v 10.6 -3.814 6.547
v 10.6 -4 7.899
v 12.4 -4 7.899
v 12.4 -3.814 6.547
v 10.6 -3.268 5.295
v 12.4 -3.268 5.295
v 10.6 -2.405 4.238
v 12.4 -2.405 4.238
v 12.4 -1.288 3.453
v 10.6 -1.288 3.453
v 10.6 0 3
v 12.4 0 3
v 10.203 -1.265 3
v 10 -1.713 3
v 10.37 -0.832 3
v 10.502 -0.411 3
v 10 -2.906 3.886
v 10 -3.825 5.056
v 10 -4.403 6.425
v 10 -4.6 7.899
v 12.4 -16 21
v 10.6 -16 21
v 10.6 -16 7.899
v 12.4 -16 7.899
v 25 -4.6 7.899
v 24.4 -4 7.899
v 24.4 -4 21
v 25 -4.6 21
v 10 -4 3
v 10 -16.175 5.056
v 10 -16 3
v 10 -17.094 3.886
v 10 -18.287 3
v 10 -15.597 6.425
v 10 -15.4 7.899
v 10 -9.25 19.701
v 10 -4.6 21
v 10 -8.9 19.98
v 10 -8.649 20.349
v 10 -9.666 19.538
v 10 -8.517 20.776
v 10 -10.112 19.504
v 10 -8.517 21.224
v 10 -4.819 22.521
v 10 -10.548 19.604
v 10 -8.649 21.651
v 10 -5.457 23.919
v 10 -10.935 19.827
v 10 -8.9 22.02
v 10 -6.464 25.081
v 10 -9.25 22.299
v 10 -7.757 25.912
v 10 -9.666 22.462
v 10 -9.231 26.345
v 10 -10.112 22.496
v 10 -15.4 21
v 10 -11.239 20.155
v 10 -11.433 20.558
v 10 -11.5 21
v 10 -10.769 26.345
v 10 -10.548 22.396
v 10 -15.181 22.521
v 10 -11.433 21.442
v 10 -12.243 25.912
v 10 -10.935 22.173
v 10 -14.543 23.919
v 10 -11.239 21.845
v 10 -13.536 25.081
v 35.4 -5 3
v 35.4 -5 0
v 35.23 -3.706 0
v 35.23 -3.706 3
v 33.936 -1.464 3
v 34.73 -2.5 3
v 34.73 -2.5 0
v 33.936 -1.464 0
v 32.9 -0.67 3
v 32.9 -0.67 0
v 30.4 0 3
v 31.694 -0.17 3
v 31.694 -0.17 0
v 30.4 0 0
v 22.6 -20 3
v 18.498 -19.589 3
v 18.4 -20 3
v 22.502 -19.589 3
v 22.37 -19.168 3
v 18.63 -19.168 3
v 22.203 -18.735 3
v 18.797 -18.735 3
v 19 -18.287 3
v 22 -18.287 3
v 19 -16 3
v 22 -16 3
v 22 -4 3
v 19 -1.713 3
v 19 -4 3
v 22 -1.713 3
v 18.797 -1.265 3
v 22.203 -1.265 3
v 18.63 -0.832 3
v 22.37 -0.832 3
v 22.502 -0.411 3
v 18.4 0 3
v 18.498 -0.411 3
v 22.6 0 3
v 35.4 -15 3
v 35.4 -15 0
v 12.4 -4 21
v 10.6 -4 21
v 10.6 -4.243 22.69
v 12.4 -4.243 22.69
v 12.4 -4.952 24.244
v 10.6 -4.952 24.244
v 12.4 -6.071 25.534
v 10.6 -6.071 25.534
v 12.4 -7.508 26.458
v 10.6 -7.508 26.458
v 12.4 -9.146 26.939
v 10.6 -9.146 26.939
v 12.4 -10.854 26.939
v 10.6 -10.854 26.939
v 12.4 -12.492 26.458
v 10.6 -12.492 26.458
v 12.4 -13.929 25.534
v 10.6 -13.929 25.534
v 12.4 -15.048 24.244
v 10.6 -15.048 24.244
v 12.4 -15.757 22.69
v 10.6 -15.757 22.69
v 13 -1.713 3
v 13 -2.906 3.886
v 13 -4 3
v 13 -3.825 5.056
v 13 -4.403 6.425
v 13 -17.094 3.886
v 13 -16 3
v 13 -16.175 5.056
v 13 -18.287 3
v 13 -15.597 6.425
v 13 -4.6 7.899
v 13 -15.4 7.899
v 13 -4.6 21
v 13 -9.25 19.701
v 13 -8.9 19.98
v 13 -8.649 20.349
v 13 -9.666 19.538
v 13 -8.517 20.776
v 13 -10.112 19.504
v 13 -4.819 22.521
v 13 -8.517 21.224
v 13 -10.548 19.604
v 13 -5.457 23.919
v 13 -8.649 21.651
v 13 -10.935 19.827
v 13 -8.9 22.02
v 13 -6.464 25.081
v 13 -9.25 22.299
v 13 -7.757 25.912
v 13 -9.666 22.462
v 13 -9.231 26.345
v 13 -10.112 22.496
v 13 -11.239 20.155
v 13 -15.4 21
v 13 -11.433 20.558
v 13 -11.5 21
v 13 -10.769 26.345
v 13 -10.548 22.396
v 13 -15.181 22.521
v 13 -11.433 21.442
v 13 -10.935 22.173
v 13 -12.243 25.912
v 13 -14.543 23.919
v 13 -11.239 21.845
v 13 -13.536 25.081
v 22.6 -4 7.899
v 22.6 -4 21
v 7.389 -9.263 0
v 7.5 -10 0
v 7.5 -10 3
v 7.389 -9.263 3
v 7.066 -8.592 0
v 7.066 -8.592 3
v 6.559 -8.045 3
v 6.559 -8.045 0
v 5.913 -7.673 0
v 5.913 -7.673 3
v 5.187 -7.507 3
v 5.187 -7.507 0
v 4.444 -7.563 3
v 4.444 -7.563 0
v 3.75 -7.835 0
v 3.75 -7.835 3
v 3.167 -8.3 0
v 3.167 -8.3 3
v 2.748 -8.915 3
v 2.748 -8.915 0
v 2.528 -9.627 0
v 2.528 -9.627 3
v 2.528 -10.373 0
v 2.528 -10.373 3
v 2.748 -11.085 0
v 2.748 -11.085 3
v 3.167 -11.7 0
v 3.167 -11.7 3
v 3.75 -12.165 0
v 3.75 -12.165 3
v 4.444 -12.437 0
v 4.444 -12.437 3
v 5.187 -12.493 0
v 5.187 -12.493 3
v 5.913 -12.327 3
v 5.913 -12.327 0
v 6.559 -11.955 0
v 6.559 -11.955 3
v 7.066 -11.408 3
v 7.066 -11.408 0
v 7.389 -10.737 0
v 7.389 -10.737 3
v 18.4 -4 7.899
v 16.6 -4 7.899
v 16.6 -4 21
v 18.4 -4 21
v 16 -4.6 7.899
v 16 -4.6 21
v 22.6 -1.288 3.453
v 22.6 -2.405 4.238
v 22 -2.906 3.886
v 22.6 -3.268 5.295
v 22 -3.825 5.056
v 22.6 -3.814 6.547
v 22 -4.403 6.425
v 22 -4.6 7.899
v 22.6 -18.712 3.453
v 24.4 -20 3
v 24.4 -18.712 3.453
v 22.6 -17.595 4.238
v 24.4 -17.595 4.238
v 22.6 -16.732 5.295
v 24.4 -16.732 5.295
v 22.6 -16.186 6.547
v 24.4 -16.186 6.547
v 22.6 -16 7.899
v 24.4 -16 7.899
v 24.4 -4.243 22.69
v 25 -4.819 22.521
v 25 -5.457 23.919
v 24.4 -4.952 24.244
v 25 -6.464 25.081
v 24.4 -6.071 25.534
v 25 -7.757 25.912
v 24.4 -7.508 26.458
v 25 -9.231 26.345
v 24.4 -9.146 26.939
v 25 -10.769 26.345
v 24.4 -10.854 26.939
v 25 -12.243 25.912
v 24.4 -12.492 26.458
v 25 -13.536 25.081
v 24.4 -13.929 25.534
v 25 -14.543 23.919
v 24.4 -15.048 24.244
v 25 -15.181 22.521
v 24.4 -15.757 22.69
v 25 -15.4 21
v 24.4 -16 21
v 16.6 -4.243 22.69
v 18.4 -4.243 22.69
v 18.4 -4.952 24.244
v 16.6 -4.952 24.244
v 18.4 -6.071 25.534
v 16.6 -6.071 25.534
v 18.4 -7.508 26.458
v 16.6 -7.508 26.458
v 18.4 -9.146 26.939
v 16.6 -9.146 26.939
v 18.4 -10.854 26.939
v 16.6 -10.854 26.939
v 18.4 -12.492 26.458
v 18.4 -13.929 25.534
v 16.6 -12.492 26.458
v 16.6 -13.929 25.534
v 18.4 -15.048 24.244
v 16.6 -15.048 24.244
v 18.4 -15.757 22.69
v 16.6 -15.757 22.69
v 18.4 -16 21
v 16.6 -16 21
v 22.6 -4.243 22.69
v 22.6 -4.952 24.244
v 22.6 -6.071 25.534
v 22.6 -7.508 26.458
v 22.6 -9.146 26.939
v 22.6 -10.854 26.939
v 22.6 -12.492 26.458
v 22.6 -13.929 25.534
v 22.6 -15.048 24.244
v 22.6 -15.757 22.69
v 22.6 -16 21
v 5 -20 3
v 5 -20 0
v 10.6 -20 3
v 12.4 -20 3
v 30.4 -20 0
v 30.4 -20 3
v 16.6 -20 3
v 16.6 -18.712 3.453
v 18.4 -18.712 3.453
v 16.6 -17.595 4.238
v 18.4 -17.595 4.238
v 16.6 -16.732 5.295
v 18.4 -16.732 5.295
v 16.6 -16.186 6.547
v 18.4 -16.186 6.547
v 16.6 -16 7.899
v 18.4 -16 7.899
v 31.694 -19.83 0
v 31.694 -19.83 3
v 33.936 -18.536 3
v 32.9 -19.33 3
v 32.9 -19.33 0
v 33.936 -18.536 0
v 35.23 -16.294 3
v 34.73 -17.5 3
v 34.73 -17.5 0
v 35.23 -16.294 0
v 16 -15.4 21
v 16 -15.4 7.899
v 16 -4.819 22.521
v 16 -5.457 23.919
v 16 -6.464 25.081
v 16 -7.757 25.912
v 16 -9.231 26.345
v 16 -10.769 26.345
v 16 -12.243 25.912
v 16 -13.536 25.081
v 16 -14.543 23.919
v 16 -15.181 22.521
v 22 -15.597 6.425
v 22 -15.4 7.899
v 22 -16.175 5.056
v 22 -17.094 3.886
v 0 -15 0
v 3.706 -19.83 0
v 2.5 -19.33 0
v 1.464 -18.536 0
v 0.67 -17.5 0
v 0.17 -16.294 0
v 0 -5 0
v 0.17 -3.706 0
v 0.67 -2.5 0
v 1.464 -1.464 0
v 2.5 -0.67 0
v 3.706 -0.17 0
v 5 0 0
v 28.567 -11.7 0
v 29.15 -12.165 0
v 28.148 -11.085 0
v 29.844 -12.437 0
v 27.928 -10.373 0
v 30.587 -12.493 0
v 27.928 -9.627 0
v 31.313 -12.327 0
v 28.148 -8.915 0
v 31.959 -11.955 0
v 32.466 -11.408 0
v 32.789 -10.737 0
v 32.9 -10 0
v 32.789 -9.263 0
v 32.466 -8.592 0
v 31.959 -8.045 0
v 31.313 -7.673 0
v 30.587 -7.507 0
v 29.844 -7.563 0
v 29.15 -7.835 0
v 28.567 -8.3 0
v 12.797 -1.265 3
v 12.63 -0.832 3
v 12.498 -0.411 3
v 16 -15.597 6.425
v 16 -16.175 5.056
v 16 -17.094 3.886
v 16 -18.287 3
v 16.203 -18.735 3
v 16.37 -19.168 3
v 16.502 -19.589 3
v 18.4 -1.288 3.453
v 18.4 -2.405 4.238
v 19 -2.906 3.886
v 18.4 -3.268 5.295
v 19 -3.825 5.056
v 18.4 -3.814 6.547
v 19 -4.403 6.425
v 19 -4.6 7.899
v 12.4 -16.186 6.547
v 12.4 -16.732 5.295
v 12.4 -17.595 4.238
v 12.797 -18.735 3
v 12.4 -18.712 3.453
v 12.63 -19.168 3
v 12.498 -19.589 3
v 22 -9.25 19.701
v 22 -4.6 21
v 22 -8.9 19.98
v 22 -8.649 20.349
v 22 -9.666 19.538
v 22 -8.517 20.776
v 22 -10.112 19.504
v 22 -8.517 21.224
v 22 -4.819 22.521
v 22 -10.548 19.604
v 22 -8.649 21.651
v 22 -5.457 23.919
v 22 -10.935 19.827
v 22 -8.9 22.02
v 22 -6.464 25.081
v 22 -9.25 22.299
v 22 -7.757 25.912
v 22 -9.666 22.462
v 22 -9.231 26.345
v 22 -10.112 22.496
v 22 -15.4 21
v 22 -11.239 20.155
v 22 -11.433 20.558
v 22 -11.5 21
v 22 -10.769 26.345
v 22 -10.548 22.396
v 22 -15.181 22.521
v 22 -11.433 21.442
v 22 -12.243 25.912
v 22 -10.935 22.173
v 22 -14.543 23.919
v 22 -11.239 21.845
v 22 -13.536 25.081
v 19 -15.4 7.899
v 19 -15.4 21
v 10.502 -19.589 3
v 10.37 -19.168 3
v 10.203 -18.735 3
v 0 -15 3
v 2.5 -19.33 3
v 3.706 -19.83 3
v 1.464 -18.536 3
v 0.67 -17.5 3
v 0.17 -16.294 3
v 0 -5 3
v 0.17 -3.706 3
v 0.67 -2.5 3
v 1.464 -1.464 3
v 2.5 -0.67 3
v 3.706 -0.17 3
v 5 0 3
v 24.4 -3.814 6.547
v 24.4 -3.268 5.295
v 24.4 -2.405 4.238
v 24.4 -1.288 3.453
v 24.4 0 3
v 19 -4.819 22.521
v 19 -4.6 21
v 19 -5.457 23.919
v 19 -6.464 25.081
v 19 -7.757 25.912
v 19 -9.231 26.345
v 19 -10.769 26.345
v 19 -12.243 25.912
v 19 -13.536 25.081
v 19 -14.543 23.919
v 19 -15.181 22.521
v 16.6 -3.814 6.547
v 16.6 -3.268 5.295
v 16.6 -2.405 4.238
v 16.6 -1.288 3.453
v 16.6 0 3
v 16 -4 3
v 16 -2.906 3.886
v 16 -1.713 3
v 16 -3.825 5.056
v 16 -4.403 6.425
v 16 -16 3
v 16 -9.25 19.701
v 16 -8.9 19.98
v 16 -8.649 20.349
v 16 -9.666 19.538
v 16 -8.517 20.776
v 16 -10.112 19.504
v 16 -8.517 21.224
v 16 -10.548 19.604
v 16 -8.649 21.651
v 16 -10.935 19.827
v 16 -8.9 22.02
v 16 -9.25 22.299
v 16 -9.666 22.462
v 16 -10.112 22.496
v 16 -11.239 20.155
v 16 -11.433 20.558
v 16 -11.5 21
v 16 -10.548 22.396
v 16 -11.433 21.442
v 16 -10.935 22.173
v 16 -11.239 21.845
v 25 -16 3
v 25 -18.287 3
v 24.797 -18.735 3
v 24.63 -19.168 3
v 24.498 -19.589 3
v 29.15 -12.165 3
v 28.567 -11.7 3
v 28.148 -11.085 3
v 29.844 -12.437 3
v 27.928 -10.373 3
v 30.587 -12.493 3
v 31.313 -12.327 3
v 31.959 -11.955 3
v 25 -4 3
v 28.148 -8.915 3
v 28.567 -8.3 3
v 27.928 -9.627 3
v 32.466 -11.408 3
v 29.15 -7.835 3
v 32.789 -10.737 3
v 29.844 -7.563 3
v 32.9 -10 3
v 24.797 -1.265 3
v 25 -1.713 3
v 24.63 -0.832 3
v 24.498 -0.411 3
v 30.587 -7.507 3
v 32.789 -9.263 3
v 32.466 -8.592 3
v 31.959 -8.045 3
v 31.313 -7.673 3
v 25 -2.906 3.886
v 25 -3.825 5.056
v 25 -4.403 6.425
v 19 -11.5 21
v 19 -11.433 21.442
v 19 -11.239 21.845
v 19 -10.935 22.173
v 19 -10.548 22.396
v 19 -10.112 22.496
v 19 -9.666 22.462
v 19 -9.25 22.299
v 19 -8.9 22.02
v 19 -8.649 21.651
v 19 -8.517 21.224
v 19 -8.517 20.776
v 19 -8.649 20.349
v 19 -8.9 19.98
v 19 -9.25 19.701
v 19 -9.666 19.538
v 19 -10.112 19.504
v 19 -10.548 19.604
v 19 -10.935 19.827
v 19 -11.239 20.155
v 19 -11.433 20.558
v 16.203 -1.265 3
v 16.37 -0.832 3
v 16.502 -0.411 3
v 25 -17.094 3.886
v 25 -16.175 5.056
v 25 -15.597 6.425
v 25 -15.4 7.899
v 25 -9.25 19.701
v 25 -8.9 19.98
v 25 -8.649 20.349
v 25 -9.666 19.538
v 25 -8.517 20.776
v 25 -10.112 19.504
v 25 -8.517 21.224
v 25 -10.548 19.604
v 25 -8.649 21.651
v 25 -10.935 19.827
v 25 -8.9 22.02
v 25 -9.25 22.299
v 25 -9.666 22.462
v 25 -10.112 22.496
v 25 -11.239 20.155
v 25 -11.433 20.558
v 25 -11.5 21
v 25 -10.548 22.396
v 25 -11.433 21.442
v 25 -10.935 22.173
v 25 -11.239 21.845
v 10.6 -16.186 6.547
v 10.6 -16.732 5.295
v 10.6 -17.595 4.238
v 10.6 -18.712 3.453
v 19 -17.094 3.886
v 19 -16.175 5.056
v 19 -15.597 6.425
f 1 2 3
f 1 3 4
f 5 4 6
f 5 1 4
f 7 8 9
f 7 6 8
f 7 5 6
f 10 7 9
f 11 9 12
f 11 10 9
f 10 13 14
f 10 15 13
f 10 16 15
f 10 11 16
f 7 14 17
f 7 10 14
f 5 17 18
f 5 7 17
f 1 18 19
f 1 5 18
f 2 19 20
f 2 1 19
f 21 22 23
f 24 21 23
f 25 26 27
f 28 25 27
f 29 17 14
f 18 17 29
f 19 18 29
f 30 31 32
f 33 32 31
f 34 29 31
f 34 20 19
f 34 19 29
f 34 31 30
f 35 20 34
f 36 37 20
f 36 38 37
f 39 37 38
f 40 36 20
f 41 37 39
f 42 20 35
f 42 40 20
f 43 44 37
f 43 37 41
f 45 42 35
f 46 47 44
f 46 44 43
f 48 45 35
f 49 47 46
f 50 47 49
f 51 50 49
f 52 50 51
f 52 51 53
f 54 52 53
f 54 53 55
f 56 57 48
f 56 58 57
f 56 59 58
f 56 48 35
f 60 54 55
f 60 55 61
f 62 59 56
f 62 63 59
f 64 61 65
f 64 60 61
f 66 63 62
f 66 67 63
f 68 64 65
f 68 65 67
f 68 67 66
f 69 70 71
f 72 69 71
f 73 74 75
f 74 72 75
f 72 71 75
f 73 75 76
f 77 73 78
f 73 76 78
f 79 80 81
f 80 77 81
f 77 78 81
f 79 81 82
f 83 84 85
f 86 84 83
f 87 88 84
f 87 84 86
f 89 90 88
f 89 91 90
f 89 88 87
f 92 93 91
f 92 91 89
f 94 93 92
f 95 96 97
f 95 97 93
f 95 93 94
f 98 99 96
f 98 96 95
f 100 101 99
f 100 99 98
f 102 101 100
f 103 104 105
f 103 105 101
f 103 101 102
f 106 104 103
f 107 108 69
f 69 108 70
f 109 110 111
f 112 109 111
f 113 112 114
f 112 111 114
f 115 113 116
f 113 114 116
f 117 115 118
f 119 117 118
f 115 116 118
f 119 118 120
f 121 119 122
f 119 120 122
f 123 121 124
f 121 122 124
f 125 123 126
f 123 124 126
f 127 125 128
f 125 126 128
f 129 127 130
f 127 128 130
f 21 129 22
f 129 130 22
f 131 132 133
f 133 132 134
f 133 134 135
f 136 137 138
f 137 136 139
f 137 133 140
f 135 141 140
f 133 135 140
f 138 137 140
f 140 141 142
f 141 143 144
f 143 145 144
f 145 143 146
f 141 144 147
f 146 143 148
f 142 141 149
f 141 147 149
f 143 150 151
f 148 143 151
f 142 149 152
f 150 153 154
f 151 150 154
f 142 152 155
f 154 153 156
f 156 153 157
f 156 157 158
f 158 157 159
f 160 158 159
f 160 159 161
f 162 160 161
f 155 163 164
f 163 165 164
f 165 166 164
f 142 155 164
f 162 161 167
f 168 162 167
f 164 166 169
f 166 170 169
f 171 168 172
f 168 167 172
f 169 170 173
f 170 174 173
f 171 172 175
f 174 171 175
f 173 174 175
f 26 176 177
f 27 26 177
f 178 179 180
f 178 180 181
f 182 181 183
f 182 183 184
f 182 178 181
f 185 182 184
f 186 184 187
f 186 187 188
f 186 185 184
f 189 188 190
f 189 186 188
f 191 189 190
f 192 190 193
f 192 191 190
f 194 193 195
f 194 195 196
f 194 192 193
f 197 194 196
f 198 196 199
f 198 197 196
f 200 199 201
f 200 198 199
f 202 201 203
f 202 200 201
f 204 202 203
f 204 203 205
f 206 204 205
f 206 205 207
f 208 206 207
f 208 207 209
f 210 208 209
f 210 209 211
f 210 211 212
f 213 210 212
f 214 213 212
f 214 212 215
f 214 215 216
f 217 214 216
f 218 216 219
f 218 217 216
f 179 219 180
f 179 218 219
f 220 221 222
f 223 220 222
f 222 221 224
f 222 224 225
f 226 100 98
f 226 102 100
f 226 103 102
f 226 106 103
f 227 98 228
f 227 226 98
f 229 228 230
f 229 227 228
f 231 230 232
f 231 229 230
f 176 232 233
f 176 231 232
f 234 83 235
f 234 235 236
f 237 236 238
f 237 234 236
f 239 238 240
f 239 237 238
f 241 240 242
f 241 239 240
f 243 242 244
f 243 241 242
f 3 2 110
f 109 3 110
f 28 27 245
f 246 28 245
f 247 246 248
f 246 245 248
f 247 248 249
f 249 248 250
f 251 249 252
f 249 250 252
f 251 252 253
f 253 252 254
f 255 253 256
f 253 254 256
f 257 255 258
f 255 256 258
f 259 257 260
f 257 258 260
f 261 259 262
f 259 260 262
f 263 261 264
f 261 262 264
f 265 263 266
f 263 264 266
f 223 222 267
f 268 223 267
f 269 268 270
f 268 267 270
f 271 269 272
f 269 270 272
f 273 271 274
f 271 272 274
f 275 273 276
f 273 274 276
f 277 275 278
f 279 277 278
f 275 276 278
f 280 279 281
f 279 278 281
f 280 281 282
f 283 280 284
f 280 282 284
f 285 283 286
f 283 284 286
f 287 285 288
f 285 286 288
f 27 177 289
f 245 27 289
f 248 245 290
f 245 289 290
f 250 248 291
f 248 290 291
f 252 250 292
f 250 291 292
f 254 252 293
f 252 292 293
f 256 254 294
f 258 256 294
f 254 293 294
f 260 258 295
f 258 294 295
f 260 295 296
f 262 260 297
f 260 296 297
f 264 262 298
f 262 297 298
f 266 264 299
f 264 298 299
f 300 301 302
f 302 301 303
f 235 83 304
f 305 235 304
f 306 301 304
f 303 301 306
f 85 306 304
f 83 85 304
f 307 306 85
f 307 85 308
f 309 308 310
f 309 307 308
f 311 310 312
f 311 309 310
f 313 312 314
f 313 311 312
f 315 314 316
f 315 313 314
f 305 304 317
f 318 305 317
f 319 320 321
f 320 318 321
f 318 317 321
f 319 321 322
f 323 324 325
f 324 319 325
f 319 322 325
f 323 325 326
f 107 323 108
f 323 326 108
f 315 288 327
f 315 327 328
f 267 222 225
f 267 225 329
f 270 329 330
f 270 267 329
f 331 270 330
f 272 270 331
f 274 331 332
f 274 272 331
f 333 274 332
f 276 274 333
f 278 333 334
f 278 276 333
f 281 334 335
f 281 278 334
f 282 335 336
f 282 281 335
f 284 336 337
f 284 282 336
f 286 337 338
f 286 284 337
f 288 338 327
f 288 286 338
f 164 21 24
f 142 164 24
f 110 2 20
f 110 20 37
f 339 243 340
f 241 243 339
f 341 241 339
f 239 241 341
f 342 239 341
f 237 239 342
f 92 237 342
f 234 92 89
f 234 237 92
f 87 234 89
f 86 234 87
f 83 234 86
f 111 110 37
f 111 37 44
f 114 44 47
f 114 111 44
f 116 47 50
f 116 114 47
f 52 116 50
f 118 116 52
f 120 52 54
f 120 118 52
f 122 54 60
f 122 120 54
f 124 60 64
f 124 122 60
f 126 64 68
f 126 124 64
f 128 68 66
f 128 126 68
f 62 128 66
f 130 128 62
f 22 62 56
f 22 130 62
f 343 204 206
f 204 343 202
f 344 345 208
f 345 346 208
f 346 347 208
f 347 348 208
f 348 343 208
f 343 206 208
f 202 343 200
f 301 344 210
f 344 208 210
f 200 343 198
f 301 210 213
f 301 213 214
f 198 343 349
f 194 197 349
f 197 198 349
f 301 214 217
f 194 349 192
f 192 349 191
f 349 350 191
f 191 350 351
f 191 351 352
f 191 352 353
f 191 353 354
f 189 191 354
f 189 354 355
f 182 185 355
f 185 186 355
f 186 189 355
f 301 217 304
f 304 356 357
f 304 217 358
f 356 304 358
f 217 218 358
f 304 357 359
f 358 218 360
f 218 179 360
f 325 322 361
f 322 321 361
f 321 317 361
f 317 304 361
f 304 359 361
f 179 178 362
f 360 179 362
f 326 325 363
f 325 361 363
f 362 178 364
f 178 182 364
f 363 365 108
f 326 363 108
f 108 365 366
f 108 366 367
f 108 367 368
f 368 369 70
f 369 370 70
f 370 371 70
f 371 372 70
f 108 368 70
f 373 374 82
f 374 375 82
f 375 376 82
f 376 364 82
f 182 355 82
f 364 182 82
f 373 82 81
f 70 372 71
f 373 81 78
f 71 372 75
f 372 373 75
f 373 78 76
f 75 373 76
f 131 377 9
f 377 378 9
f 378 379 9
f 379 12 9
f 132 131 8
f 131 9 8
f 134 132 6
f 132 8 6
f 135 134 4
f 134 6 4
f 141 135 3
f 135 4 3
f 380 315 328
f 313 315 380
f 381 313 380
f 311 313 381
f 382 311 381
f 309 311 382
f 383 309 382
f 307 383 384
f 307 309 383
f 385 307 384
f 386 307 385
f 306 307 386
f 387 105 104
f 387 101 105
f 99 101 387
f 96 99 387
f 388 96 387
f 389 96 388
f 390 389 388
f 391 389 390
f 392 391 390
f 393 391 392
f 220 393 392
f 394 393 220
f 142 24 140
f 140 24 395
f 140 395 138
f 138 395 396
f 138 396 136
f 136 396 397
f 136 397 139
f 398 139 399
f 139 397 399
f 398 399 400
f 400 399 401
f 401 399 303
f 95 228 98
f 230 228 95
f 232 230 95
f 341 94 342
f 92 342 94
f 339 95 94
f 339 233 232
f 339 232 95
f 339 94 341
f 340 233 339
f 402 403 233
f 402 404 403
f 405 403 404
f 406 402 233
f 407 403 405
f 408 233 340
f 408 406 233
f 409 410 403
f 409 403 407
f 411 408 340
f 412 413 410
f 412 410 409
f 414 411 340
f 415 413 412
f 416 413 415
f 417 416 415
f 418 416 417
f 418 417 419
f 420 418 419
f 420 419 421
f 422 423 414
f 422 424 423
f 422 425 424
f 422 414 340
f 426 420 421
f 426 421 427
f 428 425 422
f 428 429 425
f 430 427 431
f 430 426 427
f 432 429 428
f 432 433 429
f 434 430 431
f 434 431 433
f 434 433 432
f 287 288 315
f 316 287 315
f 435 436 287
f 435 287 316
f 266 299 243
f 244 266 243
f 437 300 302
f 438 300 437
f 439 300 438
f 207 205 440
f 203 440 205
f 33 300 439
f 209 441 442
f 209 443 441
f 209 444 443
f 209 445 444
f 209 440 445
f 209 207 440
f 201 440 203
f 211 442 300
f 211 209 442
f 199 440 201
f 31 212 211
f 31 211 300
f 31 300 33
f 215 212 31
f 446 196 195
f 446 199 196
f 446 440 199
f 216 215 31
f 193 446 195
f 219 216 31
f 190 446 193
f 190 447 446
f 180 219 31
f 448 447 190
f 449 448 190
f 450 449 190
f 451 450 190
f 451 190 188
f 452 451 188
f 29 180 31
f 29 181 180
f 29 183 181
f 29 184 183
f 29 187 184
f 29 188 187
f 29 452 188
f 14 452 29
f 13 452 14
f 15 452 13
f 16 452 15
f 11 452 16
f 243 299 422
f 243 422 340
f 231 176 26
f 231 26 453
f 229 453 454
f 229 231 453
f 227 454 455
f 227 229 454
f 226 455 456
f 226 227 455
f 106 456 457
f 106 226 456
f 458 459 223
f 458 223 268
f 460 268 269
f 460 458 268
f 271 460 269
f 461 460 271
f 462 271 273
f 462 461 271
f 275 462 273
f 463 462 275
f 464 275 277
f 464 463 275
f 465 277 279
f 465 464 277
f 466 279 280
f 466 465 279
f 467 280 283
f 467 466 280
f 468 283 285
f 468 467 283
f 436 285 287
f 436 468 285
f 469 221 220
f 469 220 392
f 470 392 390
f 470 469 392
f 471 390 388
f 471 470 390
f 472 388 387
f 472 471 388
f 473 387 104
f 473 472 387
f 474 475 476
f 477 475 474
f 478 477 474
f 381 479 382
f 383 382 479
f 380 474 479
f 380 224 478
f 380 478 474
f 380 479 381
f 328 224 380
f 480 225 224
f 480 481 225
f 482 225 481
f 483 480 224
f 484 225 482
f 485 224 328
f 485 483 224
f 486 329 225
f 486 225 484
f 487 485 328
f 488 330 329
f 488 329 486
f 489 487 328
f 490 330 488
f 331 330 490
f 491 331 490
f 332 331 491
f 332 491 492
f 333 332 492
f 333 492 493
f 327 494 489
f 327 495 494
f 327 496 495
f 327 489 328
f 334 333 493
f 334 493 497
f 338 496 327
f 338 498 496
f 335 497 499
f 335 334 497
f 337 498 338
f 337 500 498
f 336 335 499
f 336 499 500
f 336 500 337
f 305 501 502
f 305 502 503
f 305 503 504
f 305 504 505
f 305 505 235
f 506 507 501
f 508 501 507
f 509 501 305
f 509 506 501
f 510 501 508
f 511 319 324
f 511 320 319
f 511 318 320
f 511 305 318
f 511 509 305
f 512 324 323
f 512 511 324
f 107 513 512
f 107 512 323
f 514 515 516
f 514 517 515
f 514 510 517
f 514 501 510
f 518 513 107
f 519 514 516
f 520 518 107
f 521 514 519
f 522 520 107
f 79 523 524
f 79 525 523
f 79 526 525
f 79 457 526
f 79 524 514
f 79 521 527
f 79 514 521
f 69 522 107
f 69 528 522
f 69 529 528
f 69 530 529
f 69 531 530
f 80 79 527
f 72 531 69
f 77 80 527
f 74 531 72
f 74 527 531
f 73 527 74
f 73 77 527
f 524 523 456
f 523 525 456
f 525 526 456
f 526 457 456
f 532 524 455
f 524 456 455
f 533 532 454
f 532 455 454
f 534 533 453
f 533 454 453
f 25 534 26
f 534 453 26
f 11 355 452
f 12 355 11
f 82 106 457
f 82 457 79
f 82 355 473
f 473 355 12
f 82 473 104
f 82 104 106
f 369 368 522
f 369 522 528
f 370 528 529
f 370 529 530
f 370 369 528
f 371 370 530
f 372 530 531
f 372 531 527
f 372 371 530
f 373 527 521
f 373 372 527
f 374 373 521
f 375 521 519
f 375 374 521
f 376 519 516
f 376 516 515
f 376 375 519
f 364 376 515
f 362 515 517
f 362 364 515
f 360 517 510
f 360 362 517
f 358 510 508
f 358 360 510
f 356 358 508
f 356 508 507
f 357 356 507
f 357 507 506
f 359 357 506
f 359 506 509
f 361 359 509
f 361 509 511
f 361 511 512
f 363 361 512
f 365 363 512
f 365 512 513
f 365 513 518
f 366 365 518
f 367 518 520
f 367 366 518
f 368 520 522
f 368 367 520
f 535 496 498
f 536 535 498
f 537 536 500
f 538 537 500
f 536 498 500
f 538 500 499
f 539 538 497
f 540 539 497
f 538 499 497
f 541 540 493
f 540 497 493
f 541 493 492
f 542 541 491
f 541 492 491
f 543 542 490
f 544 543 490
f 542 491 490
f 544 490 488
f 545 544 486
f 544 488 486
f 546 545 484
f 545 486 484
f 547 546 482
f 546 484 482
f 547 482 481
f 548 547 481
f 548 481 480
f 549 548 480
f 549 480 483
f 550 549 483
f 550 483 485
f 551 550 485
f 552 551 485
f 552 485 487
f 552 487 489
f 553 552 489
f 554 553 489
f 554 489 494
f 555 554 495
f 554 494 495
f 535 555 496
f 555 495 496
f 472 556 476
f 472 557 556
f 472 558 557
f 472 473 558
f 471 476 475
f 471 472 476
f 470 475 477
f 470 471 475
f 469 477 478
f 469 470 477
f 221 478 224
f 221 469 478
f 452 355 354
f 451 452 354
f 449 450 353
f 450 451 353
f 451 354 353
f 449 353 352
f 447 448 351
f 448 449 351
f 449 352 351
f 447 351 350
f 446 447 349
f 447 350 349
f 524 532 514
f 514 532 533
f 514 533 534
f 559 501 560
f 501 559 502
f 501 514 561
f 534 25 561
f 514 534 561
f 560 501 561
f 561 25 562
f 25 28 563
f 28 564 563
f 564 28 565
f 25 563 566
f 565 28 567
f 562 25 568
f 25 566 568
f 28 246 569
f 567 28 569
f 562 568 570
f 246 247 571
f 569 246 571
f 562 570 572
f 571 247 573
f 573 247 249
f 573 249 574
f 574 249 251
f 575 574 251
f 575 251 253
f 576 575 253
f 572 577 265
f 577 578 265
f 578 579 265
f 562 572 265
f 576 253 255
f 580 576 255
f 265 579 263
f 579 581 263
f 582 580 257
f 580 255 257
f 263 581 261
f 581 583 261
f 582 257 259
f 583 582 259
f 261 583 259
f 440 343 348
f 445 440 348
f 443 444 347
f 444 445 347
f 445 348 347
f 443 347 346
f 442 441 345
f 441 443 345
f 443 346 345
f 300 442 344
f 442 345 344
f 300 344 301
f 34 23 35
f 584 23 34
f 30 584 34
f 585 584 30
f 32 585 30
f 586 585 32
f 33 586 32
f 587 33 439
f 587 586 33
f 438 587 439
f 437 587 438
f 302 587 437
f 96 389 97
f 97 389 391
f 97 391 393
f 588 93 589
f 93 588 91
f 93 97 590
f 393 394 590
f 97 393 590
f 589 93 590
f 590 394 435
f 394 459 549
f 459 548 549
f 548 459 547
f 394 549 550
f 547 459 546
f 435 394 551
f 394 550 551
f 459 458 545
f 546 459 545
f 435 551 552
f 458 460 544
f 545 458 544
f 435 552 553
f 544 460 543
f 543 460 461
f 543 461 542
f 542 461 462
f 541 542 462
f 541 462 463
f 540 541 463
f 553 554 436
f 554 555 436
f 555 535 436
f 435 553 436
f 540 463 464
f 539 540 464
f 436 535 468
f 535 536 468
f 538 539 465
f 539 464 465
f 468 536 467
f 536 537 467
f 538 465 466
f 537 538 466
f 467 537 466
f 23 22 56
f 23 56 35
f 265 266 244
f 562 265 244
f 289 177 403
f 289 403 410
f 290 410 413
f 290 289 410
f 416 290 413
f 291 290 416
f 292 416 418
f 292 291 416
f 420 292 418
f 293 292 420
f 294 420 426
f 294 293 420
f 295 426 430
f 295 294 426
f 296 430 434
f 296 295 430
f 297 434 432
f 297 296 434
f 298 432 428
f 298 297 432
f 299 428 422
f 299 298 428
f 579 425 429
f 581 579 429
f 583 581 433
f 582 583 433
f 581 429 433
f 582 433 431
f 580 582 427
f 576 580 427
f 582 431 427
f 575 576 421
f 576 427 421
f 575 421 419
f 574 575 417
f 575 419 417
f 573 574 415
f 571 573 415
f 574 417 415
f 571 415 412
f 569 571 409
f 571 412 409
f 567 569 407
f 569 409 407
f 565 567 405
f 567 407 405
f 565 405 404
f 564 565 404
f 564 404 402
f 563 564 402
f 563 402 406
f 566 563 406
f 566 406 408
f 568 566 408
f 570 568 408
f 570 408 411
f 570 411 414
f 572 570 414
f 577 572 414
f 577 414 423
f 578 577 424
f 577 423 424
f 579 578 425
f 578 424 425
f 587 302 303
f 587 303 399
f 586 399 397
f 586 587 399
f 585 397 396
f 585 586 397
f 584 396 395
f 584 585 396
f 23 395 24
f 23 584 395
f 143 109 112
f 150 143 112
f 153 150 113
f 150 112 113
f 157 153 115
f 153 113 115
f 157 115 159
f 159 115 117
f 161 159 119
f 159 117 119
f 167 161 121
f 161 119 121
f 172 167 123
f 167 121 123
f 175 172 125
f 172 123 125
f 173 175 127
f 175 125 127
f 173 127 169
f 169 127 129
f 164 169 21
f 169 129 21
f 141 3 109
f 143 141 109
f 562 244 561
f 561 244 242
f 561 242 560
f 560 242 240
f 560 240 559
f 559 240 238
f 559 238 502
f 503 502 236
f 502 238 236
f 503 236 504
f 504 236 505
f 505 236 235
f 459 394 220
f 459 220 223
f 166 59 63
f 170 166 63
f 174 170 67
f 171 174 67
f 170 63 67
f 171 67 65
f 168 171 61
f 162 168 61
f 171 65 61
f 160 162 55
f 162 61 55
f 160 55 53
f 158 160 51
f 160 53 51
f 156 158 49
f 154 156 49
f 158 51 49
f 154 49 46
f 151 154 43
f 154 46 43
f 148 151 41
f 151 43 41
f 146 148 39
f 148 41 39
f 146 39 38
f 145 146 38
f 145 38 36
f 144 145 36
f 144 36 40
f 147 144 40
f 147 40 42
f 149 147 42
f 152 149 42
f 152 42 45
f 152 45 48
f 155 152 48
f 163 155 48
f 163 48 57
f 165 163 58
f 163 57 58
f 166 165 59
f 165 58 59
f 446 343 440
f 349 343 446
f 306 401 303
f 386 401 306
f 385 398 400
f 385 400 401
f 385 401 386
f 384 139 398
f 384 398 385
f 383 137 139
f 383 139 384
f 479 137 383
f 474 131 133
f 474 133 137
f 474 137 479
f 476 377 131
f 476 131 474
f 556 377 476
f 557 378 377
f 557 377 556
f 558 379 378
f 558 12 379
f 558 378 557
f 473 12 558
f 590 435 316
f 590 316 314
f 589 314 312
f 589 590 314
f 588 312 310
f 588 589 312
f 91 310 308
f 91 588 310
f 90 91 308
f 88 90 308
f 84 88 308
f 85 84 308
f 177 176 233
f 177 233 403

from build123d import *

# Parameters (mm, degrees)
SKETCH_1_W             = 35.4
SKETCH_1_H             = 20
SKETCH_1_R             = 2.5
EXTRUDE_1_DEPTH        = 3
EXTRUDE_START          = -10
SKETCH_3_R             = 1.5
EXTRUDE_2_DEPTH        = 3
PATTERN_LINEAR_1_COUNT = 3
PATTERN_LINEAR_1_PITCH = 6
FILLET_1_R             = 5
CHAMFER_1_SIZE         = 0.6


with BuildPart() as part:
    # 草图1 → 凸台-拉伸1 (new body)
    with BuildSketch(Plane.XY):
        with Locations((17.7, -10)):
            Rectangle(SKETCH_1_W, SKETCH_1_H)
        with Locations((5, -10)):
            Circle(SKETCH_1_R, mode=Mode.SUBTRACT)
        with Locations((30.4, -10)):
            Circle(SKETCH_1_R, mode=Mode.SUBTRACT)
    extrude(amount=EXTRUDE_1_DEPTH)

    # 草图3 → 凸台-拉伸2 (add)
    with BuildSketch(Plane.ZY.offset(EXTRUDE_START)):
        with BuildLine():
            Line((3, -4), (21, -4))
            ThreePointArc((21, -4), (27, -10), (21, -16))
            Line((21, -16), (3, -16))
            Line((3, -16), (3, -4))
        make_face()
        with Locations(Location((21, -10, 0), (0, 0, 270))):
            Circle(SKETCH_3_R, mode=Mode.SUBTRACT)
    extrude_2 = extrude(amount=-EXTRUDE_2_DEPTH)

    # 阵列(线性)1: 凸台-拉伸2 ×3
    with Locations(*[(i * PATTERN_LINEAR_1_PITCH, 0, 0) for i in range(1, PATTERN_LINEAR_1_COUNT)]):
        add(extrude_2)

    # 圆角1
    # the kernel refuses this fillet: 5 mm, written as the material it adds along each edge
    with BuildSketch(Plane(origin=(10, -16, 3), x_dir=(0, -1.0, 1.572297847473644e-12), z_dir=(1, 0, 0)), Plane(origin=(16, -16, 3), x_dir=(0, -1.0, 1.572297847473644e-12), z_dir=(1, 0, 0)), Plane(origin=(22, -16, 3), x_dir=(0, -1.0, 1.572297847473644e-12), z_dir=(1, 0, 0))) as fillet_1_piece_1:
        with BuildLine():
            CenterArc((5, -4.898979486), FILLET_1_R, 101.536959033, 78.463040967)
            Line((0, -4.898979486), (0, 0))
            Line((0, 0), (4, 0))
        make_face()
    extrude(amount=3)
    with BuildSketch(Plane(origin=(-2.247448714, -16, 3), x_dir=(0, -1.0, 1.572297847473644e-12), z_dir=(1, 0, 0))) as fillet_1_piece_2_section:
        with BuildLine():
            CenterArc((5, -4.898979486), FILLET_1_R, 101.536959033, 78.463040967)
            Line((0, -4.898979486), (0, 0))
            Line((0, 0), (4, 0))
        make_face()
    fillet_1_piece_2 = extrude(amount=27.494897428, mode=Mode.PRIVATE)
    fillet_1_piece_2 = split(fillet_1_piece_2, bisect_by=Plane(origin=(16, -16, 3), z_dir=(1, 0, 0)), keep=Keep.TOP, mode=Mode.PRIVATE)
    fillet_1_piece_2 = split(fillet_1_piece_2, bisect_by=Plane(origin=(19, -16, 3), z_dir=(-1, 0, 0)), keep=Keep.TOP, mode=Mode.PRIVATE)
    add(fillet_1_piece_2)
    with BuildSketch(Plane(origin=(-2.247448714, -16, 3), x_dir=(0, -1.0, 1.572297847473644e-12), z_dir=(1, 0, 0))) as fillet_1_piece_3_section:
        with BuildLine():
            CenterArc((5, -4.898979486), FILLET_1_R, 101.536959033, 78.463040967)
            Line((0, -4.898979486), (0, 0))
            Line((0, 0), (4, 0))
        make_face()
    fillet_1_piece_3 = extrude(amount=27.494897428, mode=Mode.PRIVATE)
    fillet_1_piece_3 = split(fillet_1_piece_3, bisect_by=Plane(origin=(25, -16, 3), z_dir=(-1, 0, 0)), keep=Keep.TOP, mode=Mode.PRIVATE)
    fillet_1_piece_3 = split(fillet_1_piece_3, bisect_by=Plane(origin=(22, -16, 3), z_dir=(1, 0, 0)), keep=Keep.TOP, mode=Mode.PRIVATE)
    add(fillet_1_piece_3)
    with BuildSketch(Plane(origin=(10, -4, 3), x_dir=(0, 1.0, 1.568078999980068e-12), z_dir=(1, 0, 0)), Plane(origin=(16, -4, 3), x_dir=(0, 1.0, 1.568078999980068e-12), z_dir=(1, 0, 0)), Plane(origin=(22, -4, 3), x_dir=(0, 1.0, 1.568078999980068e-12), z_dir=(1, 0, 0))) as fillet_1_piece_4:
        with BuildLine():
            CenterArc((5, 4.898979486), FILLET_1_R, 180, 78.463040967)
            Line((0, 4.898979486), (0, 0))
            Line((0, 0), (4, 0))
        make_face()
    extrude(amount=3)
    with BuildSketch(Plane(origin=(-2.247448714, -4, 3), x_dir=(0, 1.0, 1.568078999980068e-12), z_dir=(1, 0, 0))) as fillet_1_piece_5_section:
        with BuildLine():
            CenterArc((5, 4.898979486), FILLET_1_R, 180, 78.463040967)
            Line((0, 4.898979486), (0, 0))
            Line((0, 0), (4, 0))
        make_face()
    fillet_1_piece_5 = extrude(amount=27.494897428, mode=Mode.PRIVATE)
    fillet_1_piece_5 = split(fillet_1_piece_5, bisect_by=Plane(origin=(16, -4, 3), z_dir=(1, 0, 0)), keep=Keep.TOP, mode=Mode.PRIVATE)
    fillet_1_piece_5 = split(fillet_1_piece_5, bisect_by=Plane(origin=(19, -4, 3), z_dir=(-1, 0, 0)), keep=Keep.TOP, mode=Mode.PRIVATE)
    add(fillet_1_piece_5)
    with BuildSketch(Plane(origin=(-2.247448714, -4, 3), x_dir=(0, 1.0, 1.568078999980068e-12), z_dir=(1, 0, 0))) as fillet_1_piece_6_section:
        with BuildLine():
            CenterArc((5, 4.898979486), FILLET_1_R, 180, 78.463040967)
            Line((0, 4.898979486), (0, 0))
            Line((0, 0), (4, 0))
        make_face()
    fillet_1_piece_6 = extrude(amount=27.494897428, mode=Mode.PRIVATE)
    fillet_1_piece_6 = split(fillet_1_piece_6, bisect_by=Plane(origin=(25, -4, 3), z_dir=(-1, 0, 0)), keep=Keep.TOP, mode=Mode.PRIVATE)
    fillet_1_piece_6 = split(fillet_1_piece_6, bisect_by=Plane(origin=(22, -4, 3), z_dir=(1, 0, 0)), keep=Keep.TOP, mode=Mode.PRIVATE)
    add(fillet_1_piece_6)
    with BuildSketch(Plane(origin=(3.752551286, -16, 3), x_dir=(0, -1.0, 1.572297847473644e-12), z_dir=(1, 0, 0))) as fillet_1_piece_7_section:
        with BuildLine():
            CenterArc((5, -4.898979486), FILLET_1_R, 101.536959033, 78.463040967)
            Line((0, -4.898979486), (0, 0))
            Line((0, 0), (4, 0))
        make_face()
    fillet_1_piece_7 = extrude(amount=27.494897428, mode=Mode.PRIVATE)
    fillet_1_piece_7 = split(fillet_1_piece_7, bisect_by=Plane(origin=(10, -16, 3), z_dir=(1, 0, 0)), keep=Keep.TOP, mode=Mode.PRIVATE)
    fillet_1_piece_7 = split(fillet_1_piece_7, bisect_by=Plane(origin=(13, -16, 3), z_dir=(-1, 0, 0)), keep=Keep.TOP, mode=Mode.PRIVATE)
    add(fillet_1_piece_7)
    with BuildSketch(Plane(origin=(3.752551286, -16, 3), x_dir=(0, -1.0, 1.572297847473644e-12), z_dir=(1, 0, 0))) as fillet_1_piece_8_section:
        with BuildLine():
            CenterArc((5, -4.898979486), FILLET_1_R, 101.536959033, 78.463040967)
            Line((0, -4.898979486), (0, 0))
            Line((0, 0), (4, 0))
        make_face()
    fillet_1_piece_8 = extrude(amount=27.494897428, mode=Mode.PRIVATE)
    fillet_1_piece_8 = split(fillet_1_piece_8, bisect_by=Plane(origin=(25, -16, 3), z_dir=(-1, 0, 0)), keep=Keep.TOP, mode=Mode.PRIVATE)
    fillet_1_piece_8 = split(fillet_1_piece_8, bisect_by=Plane(origin=(22, -16, 3), z_dir=(1, 0, 0)), keep=Keep.TOP, mode=Mode.PRIVATE)
    add(fillet_1_piece_8)
    with BuildSketch(Plane(origin=(3.752551286, -4, 3), x_dir=(0, 1.0, 1.568078999980068e-12), z_dir=(1, 0, 0))) as fillet_1_piece_9_section:
        with BuildLine():
            CenterArc((5, 4.898979486), FILLET_1_R, 180, 78.463040967)
            Line((0, 4.898979486), (0, 0))
            Line((0, 0), (4, 0))
        make_face()
    fillet_1_piece_9 = extrude(amount=27.494897428, mode=Mode.PRIVATE)
    fillet_1_piece_9 = split(fillet_1_piece_9, bisect_by=Plane(origin=(10, -4, 3), z_dir=(1, 0, 0)), keep=Keep.TOP, mode=Mode.PRIVATE)
    fillet_1_piece_9 = split(fillet_1_piece_9, bisect_by=Plane(origin=(13, -4, 3), z_dir=(-1, 0, 0)), keep=Keep.TOP, mode=Mode.PRIVATE)
    add(fillet_1_piece_9)
    with BuildSketch(Plane(origin=(3.752551286, -4, 3), x_dir=(0, 1.0, 1.568078999980068e-12), z_dir=(1, 0, 0))) as fillet_1_piece_10_section:
        with BuildLine():
            CenterArc((5, 4.898979486), FILLET_1_R, 180, 78.463040967)
            Line((0, 4.898979486), (0, 0))
            Line((0, 0), (4, 0))
        make_face()
    fillet_1_piece_10 = extrude(amount=27.494897428, mode=Mode.PRIVATE)
    fillet_1_piece_10 = split(fillet_1_piece_10, bisect_by=Plane(origin=(25, -4, 3), z_dir=(-1, 0, 0)), keep=Keep.TOP, mode=Mode.PRIVATE)
    fillet_1_piece_10 = split(fillet_1_piece_10, bisect_by=Plane(origin=(22, -4, 3), z_dir=(1, 0, 0)), keep=Keep.TOP, mode=Mode.PRIVATE)
    add(fillet_1_piece_10)
    with BuildSketch(Plane(origin=(9.752551286, -16, 3), x_dir=(0, -1.0, 1.572297847473644e-12), z_dir=(1, 0, 0))) as fillet_1_piece_11_section:
        with BuildLine():
            CenterArc((5, -4.898979486), FILLET_1_R, 101.536959033, 78.463040967)
            Line((0, -4.898979486), (0, 0))
            Line((0, 0), (4, 0))
        make_face()
    fillet_1_piece_11 = extrude(amount=27.494897428, mode=Mode.PRIVATE)
    fillet_1_piece_11 = split(fillet_1_piece_11, bisect_by=Plane(origin=(10, -16, 3), z_dir=(1, 0, 0)), keep=Keep.TOP, mode=Mode.PRIVATE)
    fillet_1_piece_11 = split(fillet_1_piece_11, bisect_by=Plane(origin=(13, -16, 3), z_dir=(-1, 0, 0)), keep=Keep.TOP, mode=Mode.PRIVATE)
    add(fillet_1_piece_11)
    with BuildSketch(Plane(origin=(9.752551286, -16, 3), x_dir=(0, -1.0, 1.572297847473644e-12), z_dir=(1, 0, 0))) as fillet_1_piece_12_section:
        with BuildLine():
            CenterArc((5, -4.898979486), FILLET_1_R, 101.536959033, 78.463040967)
            Line((0, -4.898979486), (0, 0))
            Line((0, 0), (4, 0))
        make_face()
    fillet_1_piece_12 = extrude(amount=27.494897428, mode=Mode.PRIVATE)
    fillet_1_piece_12 = split(fillet_1_piece_12, bisect_by=Plane(origin=(16, -16, 3), z_dir=(1, 0, 0)), keep=Keep.TOP, mode=Mode.PRIVATE)
    fillet_1_piece_12 = split(fillet_1_piece_12, bisect_by=Plane(origin=(19, -16, 3), z_dir=(-1, 0, 0)), keep=Keep.TOP, mode=Mode.PRIVATE)
    add(fillet_1_piece_12)
    with BuildSketch(Plane(origin=(9.752551286, -4, 3), x_dir=(0, 1.0, 1.568078999980068e-12), z_dir=(1, 0, 0))) as fillet_1_piece_13_section:
        with BuildLine():
            CenterArc((5, 4.898979486), FILLET_1_R, 180, 78.463040967)
            Line((0, 4.898979486), (0, 0))
            Line((0, 0), (4, 0))
        make_face()
    fillet_1_piece_13 = extrude(amount=27.494897428, mode=Mode.PRIVATE)
    fillet_1_piece_13 = split(fillet_1_piece_13, bisect_by=Plane(origin=(10, -4, 3), z_dir=(1, 0, 0)), keep=Keep.TOP, mode=Mode.PRIVATE)
    fillet_1_piece_13 = split(fillet_1_piece_13, bisect_by=Plane(origin=(13, -4, 3), z_dir=(-1, 0, 0)), keep=Keep.TOP, mode=Mode.PRIVATE)
    add(fillet_1_piece_13)
    with BuildSketch(Plane(origin=(9.752551286, -4, 3), x_dir=(0, 1.0, 1.568078999980068e-12), z_dir=(1, 0, 0))) as fillet_1_piece_14_section:
        with BuildLine():
            CenterArc((5, 4.898979486), FILLET_1_R, 180, 78.463040967)
            Line((0, 4.898979486), (0, 0))
            Line((0, 0), (4, 0))
        make_face()
    fillet_1_piece_14 = extrude(amount=27.494897428, mode=Mode.PRIVATE)
    fillet_1_piece_14 = split(fillet_1_piece_14, bisect_by=Plane(origin=(16, -4, 3), z_dir=(1, 0, 0)), keep=Keep.TOP, mode=Mode.PRIVATE)
    fillet_1_piece_14 = split(fillet_1_piece_14, bisect_by=Plane(origin=(19, -4, 3), z_dir=(-1, 0, 0)), keep=Keep.TOP, mode=Mode.PRIVATE)
    add(fillet_1_piece_14)
    # the kernel refuses this fillet: 5 mm, written as the material it takes off along each edge
    with BuildSketch(Plane(origin=(0, 0, -12.5), x_dir=(1, 0, 0), z_dir=(0, 0, 1)), Plane(origin=(35.4, -20, -12.5), x_dir=(-1, 0, 0), z_dir=(0, 0, 1))) as fillet_1_2_piece_1:
        with BuildLine():
            CenterArc((FILLET_1_R, -FILLET_1_R), FILLET_1_R, 90, 90)
            Line((0, -FILLET_1_R), (0, 0))
            Line((0, 0), (FILLET_1_R, 0))
        make_face()
    extrude(amount=28, mode=Mode.SUBTRACT)
    with BuildSketch(Plane(origin=(35.4, 0, -12.5), x_dir=(-1, 0, 0), z_dir=(0, 0, 1)), Plane(origin=(0, -20, -12.5), x_dir=(1, 0, 0), z_dir=(0, 0, 1))) as fillet_1_2_piece_2:
        with BuildLine():
            CenterArc((FILLET_1_R, FILLET_1_R), FILLET_1_R, 180, 90)
            Line((0, FILLET_1_R), (0, 0))
            Line((0, 0), (FILLET_1_R, 0))
        make_face()
    extrude(amount=28, mode=Mode.SUBTRACT)

    # 倒角1
    chamfer_1_edges = [part.edges().sort_by_distance(p)[0] for p in [
        (13, -4, 14.449489743),
        (13, -10, 27),
        (10, -10, 27),
        (10, -4, 14.449489743),
        (19, -4, 14.449489743),
        (19, -10, 27),
        (16, -10, 27),
        (16, -4, 14.449489743),
        (25, -4, 14.449489743),
        (25, -10, 27),
        (22, -10, 27),
        (22, -4, 14.449489743),
        (10, -16, 14.449489743),
        (13, -16, 14.449489743),
        (16, -16, 14.449489743),
        (19, -16, 14.449489743),
        (22, -16, 14.449489743),
        (25, -16, 14.449489743),
        (10, -17.127016654, 4.736701825),
        (13, -17.127016654, 4.736701825),
        (16, -17.127016654, 4.736701825),
        (19, -17.127016654, 4.736701825),
        (22, -17.127016654, 4.736701825),
        (25, -17.127016654, 4.736701825),
        (10, -2.872983346, 4.736701825),
        (13, -2.872983346, 4.736701825),
        (16, -2.872983346, 4.736701825),
        (19, -2.872983346, 4.736701825),
        (22, -2.872983346, 4.736701825),
        (25, -2.872983346, 4.736701825),
    ]]
    chamfer(chamfer_1_edges, length=CHAMFER_1_SIZE)


solid = part.part
